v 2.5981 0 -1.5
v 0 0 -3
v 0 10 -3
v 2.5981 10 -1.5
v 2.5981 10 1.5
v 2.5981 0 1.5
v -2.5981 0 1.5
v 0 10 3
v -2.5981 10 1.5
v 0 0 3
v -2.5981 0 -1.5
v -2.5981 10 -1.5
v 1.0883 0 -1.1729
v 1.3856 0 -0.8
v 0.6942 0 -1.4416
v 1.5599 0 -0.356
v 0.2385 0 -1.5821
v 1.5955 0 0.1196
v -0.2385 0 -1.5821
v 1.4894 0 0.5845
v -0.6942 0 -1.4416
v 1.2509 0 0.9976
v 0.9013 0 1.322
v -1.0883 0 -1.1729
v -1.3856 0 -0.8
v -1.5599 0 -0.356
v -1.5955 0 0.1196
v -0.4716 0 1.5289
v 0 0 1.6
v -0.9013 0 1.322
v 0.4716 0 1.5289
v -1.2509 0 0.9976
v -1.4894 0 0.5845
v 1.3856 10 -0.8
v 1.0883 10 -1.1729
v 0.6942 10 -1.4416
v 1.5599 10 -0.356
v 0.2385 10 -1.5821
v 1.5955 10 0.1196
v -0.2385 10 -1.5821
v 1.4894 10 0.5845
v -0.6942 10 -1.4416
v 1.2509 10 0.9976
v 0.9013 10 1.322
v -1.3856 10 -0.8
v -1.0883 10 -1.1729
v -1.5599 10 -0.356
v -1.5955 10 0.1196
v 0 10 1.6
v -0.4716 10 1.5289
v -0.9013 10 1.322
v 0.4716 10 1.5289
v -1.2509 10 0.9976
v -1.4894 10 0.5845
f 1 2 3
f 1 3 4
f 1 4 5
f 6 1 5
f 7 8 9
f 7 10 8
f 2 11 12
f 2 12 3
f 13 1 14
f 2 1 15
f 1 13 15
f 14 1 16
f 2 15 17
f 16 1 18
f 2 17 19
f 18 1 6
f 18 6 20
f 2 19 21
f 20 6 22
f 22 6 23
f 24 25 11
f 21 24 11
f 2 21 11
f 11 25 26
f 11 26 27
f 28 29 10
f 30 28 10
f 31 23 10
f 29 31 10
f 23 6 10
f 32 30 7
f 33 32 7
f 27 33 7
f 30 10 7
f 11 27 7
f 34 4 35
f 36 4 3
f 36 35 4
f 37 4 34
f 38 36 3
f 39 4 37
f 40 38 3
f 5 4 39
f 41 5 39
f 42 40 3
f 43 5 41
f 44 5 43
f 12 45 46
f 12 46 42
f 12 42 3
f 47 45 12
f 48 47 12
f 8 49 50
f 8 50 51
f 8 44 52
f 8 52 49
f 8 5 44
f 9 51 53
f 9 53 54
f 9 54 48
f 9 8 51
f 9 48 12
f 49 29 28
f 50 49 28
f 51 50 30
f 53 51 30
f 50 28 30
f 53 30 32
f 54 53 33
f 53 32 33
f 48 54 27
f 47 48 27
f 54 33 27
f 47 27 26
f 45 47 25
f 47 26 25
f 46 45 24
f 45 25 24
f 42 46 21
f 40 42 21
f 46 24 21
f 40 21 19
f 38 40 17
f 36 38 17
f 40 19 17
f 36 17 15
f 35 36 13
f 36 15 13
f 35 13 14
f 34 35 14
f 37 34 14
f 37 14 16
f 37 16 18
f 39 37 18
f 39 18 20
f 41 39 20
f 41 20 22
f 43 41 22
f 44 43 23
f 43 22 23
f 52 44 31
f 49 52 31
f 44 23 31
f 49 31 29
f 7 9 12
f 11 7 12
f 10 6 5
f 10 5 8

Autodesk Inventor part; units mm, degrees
ref_plane "YZ Plane" through (0, 0, 0) normal (1, 0, 0) x (0, 1, 0)
ref_plane "XZ Plane" through (0, 0, 0) normal (0, 1, 0) x (-1, 0, 0)
ref_plane "XY Plane" through (0, 0, 0) normal (0, 0, 1) x (1, 0, 0)
sketch "Sketch1" plane through (0, 0, 0) normal (0, 1, 0) x (-1, 0, 0)
  line L0 (0, 0) -> (0, -3)
  line L1 (0, -3) -> (-2.5981, -1.5)
  line L2 (-2.5981, -1.5) -> (-2.5981, 1.5)
  line L3 (-2.5981, 1.5) -> (0, 3)
  line L4 (0, 3) -> (2.5981, 1.5)
  line L5 (2.5981, 1.5) -> (2.5981, -1.5)
  line L6 (2.5981, -1.5) -> (0, -3)
  dimension "d0" = 3
extrude "Extrusion1" add sketch "Sketch1" along normal blind 10
sketch "Sketch2" plane through (0, 10, 0) normal (0, 1, 0) x (1, 0, 0)
  point P0 (0, 0)
  point P1 (0, 0)
hole "Hole1" at (0, 10, 0) direction (0, -1, 0) diameter 3.2 end through all clearance for "Flat Head Machine Screw" size "M3" standard "Ansi Metric M Profile"
properties part number "M3x10-threaded"
